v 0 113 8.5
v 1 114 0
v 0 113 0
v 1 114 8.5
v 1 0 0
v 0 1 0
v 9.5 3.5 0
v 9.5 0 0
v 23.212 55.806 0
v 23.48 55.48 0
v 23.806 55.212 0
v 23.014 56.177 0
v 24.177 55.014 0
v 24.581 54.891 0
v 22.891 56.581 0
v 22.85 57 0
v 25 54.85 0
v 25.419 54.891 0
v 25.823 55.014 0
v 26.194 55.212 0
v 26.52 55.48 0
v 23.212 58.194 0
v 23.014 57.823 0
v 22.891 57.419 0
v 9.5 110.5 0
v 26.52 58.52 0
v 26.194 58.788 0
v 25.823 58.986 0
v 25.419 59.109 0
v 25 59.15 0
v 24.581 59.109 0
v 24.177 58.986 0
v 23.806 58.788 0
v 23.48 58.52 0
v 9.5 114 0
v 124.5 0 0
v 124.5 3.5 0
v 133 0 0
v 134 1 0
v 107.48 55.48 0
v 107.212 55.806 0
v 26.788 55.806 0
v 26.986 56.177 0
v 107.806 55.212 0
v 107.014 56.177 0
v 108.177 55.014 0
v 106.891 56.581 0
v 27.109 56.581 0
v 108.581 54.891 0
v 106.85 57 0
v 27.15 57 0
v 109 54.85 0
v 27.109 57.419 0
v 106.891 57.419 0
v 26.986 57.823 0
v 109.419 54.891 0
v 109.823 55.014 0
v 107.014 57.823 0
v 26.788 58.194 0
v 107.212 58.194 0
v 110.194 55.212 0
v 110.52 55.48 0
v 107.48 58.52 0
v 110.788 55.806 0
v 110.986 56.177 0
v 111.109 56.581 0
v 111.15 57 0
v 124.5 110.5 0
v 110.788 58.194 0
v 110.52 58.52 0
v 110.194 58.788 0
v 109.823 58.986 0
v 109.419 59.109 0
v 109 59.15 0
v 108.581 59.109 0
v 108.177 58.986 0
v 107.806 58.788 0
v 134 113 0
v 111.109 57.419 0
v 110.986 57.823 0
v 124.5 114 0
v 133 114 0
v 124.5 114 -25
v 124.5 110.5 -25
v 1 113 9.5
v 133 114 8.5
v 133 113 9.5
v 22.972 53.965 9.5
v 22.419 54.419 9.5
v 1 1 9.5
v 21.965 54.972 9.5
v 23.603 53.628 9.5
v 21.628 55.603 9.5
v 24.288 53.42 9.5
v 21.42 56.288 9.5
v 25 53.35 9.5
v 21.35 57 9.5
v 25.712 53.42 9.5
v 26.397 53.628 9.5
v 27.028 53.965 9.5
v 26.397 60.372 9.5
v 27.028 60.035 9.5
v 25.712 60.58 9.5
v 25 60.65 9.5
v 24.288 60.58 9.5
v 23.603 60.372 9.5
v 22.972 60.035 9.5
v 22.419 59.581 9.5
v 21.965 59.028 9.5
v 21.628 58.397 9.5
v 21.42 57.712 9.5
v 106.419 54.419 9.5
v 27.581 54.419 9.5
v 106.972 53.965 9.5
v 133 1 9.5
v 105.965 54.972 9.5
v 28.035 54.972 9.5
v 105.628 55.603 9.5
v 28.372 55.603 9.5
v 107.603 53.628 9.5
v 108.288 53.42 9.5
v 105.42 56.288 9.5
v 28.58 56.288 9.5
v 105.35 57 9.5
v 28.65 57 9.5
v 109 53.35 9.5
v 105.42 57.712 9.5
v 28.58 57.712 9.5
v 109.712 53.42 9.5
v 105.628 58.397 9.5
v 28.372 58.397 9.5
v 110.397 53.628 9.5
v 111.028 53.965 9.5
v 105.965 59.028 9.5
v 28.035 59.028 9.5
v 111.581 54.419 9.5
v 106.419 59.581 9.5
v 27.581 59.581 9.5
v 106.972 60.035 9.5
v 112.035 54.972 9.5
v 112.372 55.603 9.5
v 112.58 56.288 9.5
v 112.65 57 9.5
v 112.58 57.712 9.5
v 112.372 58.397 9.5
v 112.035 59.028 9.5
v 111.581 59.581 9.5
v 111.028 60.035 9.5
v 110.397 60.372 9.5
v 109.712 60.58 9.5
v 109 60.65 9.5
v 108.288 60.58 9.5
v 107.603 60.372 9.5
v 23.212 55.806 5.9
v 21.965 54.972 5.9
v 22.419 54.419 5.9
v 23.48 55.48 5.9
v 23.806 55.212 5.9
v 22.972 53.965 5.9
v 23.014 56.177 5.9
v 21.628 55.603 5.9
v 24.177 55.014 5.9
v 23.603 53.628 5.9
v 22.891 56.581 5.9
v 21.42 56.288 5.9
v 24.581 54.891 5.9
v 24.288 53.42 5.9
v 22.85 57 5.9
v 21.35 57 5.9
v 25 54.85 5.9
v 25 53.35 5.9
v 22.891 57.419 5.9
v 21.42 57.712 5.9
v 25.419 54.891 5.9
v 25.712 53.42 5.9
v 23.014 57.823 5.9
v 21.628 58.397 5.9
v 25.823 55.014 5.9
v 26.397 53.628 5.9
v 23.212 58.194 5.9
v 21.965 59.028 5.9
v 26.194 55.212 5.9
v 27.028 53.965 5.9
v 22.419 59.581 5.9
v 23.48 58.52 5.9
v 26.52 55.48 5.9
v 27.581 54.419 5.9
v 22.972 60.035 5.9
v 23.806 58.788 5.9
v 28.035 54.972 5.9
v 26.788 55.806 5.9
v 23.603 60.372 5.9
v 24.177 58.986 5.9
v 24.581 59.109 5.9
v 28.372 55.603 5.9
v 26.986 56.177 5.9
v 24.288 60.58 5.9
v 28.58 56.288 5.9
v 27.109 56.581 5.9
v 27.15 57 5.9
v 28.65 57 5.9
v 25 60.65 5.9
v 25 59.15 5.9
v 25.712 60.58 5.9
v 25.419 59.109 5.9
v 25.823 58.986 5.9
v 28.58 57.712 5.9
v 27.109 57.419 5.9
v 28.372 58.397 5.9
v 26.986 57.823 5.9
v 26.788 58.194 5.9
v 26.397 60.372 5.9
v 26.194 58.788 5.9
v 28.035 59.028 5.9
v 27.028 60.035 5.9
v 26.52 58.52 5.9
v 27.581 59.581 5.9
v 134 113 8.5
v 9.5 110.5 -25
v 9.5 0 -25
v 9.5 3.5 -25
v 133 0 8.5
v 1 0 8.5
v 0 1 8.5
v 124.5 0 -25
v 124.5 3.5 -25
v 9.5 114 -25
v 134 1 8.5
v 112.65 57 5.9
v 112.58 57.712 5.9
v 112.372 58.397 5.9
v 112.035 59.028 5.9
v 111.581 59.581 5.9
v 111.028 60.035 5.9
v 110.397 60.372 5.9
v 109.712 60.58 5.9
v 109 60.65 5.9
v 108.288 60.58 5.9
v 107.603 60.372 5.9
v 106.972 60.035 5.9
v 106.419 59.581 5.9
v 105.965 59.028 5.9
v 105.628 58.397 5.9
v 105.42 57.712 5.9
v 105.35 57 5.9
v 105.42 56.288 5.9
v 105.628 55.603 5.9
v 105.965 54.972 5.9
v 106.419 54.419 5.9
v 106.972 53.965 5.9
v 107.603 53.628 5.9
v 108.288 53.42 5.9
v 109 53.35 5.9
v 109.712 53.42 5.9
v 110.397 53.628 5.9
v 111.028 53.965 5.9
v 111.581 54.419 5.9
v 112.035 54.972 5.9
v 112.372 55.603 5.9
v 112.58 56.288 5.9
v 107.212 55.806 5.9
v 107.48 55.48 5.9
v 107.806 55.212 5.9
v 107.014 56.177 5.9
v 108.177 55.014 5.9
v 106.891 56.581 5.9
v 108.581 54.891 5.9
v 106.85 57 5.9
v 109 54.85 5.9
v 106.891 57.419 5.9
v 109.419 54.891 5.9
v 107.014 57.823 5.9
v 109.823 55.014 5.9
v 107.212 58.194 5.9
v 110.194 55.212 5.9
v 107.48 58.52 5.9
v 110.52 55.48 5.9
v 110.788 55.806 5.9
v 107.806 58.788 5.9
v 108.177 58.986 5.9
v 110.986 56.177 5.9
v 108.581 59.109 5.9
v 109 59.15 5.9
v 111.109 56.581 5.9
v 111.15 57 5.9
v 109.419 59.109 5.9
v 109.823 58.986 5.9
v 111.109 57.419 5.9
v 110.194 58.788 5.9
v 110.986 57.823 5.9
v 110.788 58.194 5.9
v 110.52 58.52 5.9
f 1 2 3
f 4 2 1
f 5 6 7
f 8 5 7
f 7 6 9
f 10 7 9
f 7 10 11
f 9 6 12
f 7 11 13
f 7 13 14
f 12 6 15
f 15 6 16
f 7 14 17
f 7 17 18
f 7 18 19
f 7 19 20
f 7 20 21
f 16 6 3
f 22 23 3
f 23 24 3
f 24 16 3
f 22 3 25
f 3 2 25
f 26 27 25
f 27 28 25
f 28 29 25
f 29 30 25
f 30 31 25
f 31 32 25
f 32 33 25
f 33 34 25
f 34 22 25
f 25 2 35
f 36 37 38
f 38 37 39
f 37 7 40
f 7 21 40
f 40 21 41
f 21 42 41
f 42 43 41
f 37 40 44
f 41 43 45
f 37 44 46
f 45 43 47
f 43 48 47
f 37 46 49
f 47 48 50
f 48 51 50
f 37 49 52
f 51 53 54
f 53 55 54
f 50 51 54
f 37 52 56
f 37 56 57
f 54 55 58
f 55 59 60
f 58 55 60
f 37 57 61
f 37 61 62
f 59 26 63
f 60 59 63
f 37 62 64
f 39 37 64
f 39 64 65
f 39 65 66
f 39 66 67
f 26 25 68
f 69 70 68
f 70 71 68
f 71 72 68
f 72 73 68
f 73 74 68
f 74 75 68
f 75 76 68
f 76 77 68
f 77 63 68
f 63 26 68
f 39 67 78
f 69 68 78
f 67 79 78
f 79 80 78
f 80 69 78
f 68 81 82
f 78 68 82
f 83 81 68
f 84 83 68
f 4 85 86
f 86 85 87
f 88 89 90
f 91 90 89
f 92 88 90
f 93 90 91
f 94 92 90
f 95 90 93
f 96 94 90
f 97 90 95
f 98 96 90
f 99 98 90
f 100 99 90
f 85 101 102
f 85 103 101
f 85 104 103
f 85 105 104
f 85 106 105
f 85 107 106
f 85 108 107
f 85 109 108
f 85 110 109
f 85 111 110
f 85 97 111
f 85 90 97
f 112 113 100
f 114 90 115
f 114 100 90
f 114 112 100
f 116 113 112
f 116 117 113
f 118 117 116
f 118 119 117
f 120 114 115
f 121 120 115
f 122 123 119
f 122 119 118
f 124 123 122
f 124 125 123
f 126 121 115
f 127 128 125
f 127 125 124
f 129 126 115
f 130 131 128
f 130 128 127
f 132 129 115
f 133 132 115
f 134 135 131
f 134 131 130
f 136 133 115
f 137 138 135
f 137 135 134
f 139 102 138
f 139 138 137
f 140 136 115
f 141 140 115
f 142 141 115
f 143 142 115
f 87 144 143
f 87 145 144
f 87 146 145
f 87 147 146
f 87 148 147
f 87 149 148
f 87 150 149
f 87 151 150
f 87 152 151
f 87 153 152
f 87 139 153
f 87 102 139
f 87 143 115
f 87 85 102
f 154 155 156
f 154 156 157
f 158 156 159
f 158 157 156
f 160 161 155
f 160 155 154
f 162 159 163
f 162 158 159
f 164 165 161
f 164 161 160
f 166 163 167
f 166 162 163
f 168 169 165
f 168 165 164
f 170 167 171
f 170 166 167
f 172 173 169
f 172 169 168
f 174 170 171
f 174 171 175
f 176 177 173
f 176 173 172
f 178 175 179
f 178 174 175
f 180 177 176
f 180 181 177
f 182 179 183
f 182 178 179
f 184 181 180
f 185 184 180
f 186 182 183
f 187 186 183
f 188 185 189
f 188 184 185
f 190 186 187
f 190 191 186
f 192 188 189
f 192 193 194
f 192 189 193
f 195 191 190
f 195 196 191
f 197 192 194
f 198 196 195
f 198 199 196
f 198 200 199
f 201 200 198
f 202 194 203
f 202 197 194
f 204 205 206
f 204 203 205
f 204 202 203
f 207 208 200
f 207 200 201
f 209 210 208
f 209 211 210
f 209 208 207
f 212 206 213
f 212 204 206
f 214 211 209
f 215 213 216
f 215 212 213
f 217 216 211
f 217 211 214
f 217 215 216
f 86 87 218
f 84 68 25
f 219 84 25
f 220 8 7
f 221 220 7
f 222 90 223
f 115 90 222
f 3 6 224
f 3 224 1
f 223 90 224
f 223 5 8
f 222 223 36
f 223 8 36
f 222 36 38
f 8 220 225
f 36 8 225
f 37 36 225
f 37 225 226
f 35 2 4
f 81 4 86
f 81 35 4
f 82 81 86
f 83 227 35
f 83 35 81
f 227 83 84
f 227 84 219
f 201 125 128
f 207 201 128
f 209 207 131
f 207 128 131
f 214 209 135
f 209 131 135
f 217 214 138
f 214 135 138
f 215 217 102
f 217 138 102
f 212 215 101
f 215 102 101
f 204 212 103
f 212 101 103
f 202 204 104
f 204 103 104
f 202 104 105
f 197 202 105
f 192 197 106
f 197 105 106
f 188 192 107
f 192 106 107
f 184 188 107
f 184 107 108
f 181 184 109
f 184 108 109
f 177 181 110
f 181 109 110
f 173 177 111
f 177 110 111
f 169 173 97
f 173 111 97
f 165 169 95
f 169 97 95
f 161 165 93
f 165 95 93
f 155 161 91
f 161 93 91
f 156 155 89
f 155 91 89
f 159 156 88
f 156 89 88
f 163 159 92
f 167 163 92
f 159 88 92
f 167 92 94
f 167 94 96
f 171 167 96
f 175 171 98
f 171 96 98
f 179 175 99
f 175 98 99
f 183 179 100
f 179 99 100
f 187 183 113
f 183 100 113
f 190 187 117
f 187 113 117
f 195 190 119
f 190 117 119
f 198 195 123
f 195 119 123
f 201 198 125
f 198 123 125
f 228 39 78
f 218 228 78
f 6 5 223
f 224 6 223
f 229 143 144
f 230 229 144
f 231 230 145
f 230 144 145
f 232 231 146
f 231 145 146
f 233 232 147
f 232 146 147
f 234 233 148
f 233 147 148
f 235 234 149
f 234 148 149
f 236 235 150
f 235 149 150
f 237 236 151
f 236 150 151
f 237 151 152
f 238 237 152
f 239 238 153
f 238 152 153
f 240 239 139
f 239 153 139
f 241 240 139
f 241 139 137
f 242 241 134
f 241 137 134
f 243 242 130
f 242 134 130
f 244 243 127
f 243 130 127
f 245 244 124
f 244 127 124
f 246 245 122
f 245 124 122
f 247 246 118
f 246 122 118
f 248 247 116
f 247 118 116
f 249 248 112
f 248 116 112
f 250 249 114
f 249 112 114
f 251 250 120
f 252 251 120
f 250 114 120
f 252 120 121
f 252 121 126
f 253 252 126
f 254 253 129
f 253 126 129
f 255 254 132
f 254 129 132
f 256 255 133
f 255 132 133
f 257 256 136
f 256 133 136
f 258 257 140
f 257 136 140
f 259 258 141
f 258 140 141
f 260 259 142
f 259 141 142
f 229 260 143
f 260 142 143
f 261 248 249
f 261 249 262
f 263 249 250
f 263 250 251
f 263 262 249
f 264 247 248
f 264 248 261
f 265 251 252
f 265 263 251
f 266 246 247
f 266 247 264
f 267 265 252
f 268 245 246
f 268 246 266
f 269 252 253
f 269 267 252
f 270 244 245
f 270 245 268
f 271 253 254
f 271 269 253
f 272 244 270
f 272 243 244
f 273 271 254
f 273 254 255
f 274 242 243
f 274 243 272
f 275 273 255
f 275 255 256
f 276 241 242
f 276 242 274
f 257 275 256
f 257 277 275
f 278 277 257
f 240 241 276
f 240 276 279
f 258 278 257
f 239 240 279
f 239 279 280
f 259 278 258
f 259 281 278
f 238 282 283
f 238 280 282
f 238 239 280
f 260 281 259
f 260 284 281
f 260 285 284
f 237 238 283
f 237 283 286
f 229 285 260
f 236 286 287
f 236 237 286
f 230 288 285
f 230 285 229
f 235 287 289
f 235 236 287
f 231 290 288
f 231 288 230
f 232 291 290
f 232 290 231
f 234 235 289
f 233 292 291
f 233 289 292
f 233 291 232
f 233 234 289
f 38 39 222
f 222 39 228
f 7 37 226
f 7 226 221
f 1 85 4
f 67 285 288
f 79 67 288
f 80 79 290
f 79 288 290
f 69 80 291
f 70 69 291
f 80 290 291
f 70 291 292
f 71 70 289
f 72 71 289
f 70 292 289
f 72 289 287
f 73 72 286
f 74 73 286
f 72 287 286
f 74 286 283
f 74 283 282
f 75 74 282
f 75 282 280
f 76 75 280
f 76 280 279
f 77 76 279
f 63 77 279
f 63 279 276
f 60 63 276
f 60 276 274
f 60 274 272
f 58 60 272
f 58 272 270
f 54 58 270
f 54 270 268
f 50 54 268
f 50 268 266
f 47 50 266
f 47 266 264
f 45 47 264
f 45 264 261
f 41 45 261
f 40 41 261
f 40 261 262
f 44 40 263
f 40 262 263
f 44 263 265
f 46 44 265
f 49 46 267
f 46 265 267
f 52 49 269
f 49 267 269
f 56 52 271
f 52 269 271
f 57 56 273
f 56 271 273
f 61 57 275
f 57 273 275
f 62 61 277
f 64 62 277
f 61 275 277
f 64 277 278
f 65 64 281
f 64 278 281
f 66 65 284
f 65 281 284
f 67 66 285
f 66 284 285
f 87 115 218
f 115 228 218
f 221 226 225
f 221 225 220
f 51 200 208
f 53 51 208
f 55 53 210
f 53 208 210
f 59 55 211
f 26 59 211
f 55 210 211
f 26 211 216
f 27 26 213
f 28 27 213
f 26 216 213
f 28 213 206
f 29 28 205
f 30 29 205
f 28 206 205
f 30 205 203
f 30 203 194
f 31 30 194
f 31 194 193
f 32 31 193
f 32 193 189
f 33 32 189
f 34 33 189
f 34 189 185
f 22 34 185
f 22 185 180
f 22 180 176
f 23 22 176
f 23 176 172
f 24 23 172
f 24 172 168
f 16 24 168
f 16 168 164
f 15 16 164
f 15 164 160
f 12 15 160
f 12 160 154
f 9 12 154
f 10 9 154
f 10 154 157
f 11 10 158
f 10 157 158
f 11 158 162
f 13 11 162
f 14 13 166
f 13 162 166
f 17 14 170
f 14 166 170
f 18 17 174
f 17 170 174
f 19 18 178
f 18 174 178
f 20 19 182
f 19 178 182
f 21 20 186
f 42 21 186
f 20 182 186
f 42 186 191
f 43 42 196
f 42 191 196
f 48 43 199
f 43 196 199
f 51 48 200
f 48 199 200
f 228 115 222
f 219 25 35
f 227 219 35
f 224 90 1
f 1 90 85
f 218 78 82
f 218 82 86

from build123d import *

# Parameters (mm, degrees)
SKETCH1_W           = 134
SKETCH1_H           = 114
BOSS_EXTRUDE1_DEPTH = 9.5
SKETCH2_W           = 115
SKETCH2_H           = 3.5
BOSS_EXTRUDE2_DEPTH = 25
SKETCH3_R           = 2.15
CUT_EXTRUDE1_DEPTH  = 180.282598152
SKETCH4_R           = 3.65
CUT_EXTRUDE2_DEPTH  = 3.6
CHAMFER1_SIZE       = 1


with BuildPart() as part:
    # Sketch1 → Boss-Extrude1 (new body)
    with BuildSketch(Plane.XY):
        with Locations((67, 57)):
            Rectangle(SKETCH1_W, SKETCH1_H)
    extrude(amount=BOSS_EXTRUDE1_DEPTH)

    # Sketch2 → Boss-Extrude2 (add)
    with BuildSketch(Plane(origin=(0, 0, 0), x_dir=(-1, 0, 0), z_dir=(0, 0, -1))):
        Polygon((-67, 114), (-124.5, 114), (-124.5, 110.5), (-9.5, 110.5), (-9.5, 114), align=None)
        with Locations((-67, 1.75)):
            Rectangle(SKETCH2_W, SKETCH2_H)
    extrude(amount=BOSS_EXTRUDE2_DEPTH)

    # Sketch3 → Cut-Extrude1 (cut, through all)
    with BuildSketch(Plane.XY.offset(9.5)):
        with Locations((25, 57)):
            Circle(SKETCH3_R)
        with Locations((109, 57)):
            Circle(SKETCH3_R)
    extrude(amount=-CUT_EXTRUDE1_DEPTH, mode=Mode.SUBTRACT)

    # Sketch4 → Cut-Extrude2 (cut)
    with BuildSketch(Plane.XY.offset(9.5)):
        with Locations((25, 57)):
            Circle(SKETCH4_R)
        with Locations((109, 57)):
            Circle(SKETCH4_R)
    extrude(amount=-CUT_EXTRUDE2_DEPTH, mode=Mode.SUBTRACT)

    # Chamfer1
    chamfer1_edges = [part.edges().sort_by_distance(p)[0] for p in [
        (134, 57, 9.5),
        (67, 114, 9.5),
        (0, 57, 9.5),
        (67, 0, 9.5),
        (0, 114, 4.75),
        (134, 114, 4.75),
        (134, 0, 4.75),
        (0, 0, 4.75),
    ]]
    chamfer(chamfer1_edges, length=CHAMFER1_SIZE)


solid = part.part
